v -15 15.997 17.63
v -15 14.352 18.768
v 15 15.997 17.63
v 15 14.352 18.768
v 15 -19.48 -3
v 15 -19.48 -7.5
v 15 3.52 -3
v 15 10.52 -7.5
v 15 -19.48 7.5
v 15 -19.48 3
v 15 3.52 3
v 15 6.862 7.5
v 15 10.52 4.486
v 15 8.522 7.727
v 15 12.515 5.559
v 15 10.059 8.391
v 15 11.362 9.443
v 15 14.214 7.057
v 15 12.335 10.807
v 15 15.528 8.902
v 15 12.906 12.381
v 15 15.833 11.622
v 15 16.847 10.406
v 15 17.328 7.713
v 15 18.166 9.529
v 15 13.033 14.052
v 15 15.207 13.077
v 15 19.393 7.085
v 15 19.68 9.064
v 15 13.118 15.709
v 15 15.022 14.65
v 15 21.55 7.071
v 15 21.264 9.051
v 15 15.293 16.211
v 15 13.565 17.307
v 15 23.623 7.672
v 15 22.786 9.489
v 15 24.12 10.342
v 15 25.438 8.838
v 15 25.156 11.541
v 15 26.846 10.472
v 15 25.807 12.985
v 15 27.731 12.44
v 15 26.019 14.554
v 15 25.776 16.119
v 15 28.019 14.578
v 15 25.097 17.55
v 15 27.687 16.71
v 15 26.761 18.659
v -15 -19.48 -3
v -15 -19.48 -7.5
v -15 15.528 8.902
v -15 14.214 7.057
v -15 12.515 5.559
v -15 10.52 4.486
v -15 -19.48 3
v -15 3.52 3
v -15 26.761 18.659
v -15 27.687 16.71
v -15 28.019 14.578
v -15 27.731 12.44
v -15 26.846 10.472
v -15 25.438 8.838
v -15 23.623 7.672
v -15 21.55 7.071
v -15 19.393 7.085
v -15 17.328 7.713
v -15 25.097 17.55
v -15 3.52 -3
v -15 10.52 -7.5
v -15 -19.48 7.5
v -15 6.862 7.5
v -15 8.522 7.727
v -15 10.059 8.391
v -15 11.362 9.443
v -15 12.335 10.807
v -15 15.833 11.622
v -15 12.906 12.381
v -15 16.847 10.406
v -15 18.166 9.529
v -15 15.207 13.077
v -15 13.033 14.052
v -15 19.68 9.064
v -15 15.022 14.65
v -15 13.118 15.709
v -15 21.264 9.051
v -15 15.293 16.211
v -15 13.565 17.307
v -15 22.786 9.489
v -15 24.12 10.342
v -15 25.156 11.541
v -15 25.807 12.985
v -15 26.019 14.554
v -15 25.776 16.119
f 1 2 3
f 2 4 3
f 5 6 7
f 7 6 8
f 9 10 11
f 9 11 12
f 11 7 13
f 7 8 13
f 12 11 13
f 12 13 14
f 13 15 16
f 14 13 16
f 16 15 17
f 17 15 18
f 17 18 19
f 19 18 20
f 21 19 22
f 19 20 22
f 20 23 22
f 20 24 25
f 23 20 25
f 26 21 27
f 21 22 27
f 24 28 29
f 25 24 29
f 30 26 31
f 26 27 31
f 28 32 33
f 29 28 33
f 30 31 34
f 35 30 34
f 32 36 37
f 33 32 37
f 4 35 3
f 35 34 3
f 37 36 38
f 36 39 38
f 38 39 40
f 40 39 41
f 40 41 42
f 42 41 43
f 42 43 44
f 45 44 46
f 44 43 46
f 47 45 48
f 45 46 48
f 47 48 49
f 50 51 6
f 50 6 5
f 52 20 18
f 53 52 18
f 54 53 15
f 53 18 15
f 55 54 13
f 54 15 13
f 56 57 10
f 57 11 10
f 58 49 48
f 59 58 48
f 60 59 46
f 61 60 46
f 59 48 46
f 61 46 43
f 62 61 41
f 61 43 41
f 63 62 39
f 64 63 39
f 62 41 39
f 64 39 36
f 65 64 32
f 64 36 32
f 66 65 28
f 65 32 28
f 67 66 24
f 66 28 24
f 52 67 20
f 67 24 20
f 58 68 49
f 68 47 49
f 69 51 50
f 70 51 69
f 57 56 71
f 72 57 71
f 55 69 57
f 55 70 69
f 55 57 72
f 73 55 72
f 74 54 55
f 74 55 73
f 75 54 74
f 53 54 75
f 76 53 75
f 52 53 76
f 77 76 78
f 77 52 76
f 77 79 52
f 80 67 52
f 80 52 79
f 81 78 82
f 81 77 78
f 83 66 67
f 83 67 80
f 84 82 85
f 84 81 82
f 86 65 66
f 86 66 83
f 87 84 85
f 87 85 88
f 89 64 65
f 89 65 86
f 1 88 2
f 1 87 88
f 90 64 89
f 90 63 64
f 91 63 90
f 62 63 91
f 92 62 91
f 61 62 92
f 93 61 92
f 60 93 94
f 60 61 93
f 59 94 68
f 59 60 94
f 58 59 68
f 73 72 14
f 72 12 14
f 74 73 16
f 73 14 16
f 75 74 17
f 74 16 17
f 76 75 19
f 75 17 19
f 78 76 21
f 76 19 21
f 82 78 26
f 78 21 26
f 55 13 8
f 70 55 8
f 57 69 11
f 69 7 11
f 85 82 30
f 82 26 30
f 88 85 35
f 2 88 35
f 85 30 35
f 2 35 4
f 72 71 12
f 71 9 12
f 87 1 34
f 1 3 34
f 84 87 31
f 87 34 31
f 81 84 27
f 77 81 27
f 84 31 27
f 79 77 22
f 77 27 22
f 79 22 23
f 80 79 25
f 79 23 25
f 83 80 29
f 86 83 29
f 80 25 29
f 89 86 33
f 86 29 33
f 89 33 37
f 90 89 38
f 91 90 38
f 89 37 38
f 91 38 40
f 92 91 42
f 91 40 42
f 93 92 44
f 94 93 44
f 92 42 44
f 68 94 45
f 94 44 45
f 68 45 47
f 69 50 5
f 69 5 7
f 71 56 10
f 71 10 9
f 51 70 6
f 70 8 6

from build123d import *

# Parameters (mm, degrees)
SALIENTE_EXTRUIR1_DEPTH = 15


with BuildPart() as part:
    # Croquis1 → Saliente-Extruir1 (new body, symmetric)
    with BuildSketch(Plane(origin=(0, 0, 0), x_dir=(0, 0, -1), z_dir=(1, 0, 0))):
        with BuildLine():
            Line((-4.485879944, 10.519685039), (7.5, 10.519685039))
            Line((7.5, 10.519685039), (7.5, -19.480314961))
            Line((7.5, -19.480314961), (3, -19.480314961))
            Line((3, -19.480314961), (3, 3.519685039))
            Line((3, 3.519685039), (-3, 3.519685039))
            Line((-3, 3.519685039), (-3, -19.480314961))
            Line((-3, -19.480314961), (-7.5, -19.480314961))
            Line((-7.5, -19.480314961), (-7.5, 6.862248573))
            ThreePointArc((-7.5, 6.862248573), (-9.443341526, 11.362312215), (-14.051551981, 13.033104086))
            ThreePointArc((-14.051551981, 13.033104086), (-16.52030717, 13.29691833), (-18.767660033, 14.35226436))
            Line((-18.767660033, 14.35226436), (-17.629617358, 15.996909874))
            ThreePointArc((-17.629617358, 15.996909874), (-9.000210285, 20.471590491), (-17.550043283, 25.096500086))
            Line((-17.550043283, 25.096500086), (-18.659149931, 26.760796467))
            ThreePointArc((-18.659149931, 26.760796467), (-8.837821951, 25.437991632), (-8.902233659, 15.528191075))
            ThreePointArc((-8.902233659, 15.528191075), (-6.25888029, 13.407663941), (-4.485879944, 10.519685039))
        make_face()
    extrude(amount=SALIENTE_EXTRUIR1_DEPTH, both=True)


solid = part.part
